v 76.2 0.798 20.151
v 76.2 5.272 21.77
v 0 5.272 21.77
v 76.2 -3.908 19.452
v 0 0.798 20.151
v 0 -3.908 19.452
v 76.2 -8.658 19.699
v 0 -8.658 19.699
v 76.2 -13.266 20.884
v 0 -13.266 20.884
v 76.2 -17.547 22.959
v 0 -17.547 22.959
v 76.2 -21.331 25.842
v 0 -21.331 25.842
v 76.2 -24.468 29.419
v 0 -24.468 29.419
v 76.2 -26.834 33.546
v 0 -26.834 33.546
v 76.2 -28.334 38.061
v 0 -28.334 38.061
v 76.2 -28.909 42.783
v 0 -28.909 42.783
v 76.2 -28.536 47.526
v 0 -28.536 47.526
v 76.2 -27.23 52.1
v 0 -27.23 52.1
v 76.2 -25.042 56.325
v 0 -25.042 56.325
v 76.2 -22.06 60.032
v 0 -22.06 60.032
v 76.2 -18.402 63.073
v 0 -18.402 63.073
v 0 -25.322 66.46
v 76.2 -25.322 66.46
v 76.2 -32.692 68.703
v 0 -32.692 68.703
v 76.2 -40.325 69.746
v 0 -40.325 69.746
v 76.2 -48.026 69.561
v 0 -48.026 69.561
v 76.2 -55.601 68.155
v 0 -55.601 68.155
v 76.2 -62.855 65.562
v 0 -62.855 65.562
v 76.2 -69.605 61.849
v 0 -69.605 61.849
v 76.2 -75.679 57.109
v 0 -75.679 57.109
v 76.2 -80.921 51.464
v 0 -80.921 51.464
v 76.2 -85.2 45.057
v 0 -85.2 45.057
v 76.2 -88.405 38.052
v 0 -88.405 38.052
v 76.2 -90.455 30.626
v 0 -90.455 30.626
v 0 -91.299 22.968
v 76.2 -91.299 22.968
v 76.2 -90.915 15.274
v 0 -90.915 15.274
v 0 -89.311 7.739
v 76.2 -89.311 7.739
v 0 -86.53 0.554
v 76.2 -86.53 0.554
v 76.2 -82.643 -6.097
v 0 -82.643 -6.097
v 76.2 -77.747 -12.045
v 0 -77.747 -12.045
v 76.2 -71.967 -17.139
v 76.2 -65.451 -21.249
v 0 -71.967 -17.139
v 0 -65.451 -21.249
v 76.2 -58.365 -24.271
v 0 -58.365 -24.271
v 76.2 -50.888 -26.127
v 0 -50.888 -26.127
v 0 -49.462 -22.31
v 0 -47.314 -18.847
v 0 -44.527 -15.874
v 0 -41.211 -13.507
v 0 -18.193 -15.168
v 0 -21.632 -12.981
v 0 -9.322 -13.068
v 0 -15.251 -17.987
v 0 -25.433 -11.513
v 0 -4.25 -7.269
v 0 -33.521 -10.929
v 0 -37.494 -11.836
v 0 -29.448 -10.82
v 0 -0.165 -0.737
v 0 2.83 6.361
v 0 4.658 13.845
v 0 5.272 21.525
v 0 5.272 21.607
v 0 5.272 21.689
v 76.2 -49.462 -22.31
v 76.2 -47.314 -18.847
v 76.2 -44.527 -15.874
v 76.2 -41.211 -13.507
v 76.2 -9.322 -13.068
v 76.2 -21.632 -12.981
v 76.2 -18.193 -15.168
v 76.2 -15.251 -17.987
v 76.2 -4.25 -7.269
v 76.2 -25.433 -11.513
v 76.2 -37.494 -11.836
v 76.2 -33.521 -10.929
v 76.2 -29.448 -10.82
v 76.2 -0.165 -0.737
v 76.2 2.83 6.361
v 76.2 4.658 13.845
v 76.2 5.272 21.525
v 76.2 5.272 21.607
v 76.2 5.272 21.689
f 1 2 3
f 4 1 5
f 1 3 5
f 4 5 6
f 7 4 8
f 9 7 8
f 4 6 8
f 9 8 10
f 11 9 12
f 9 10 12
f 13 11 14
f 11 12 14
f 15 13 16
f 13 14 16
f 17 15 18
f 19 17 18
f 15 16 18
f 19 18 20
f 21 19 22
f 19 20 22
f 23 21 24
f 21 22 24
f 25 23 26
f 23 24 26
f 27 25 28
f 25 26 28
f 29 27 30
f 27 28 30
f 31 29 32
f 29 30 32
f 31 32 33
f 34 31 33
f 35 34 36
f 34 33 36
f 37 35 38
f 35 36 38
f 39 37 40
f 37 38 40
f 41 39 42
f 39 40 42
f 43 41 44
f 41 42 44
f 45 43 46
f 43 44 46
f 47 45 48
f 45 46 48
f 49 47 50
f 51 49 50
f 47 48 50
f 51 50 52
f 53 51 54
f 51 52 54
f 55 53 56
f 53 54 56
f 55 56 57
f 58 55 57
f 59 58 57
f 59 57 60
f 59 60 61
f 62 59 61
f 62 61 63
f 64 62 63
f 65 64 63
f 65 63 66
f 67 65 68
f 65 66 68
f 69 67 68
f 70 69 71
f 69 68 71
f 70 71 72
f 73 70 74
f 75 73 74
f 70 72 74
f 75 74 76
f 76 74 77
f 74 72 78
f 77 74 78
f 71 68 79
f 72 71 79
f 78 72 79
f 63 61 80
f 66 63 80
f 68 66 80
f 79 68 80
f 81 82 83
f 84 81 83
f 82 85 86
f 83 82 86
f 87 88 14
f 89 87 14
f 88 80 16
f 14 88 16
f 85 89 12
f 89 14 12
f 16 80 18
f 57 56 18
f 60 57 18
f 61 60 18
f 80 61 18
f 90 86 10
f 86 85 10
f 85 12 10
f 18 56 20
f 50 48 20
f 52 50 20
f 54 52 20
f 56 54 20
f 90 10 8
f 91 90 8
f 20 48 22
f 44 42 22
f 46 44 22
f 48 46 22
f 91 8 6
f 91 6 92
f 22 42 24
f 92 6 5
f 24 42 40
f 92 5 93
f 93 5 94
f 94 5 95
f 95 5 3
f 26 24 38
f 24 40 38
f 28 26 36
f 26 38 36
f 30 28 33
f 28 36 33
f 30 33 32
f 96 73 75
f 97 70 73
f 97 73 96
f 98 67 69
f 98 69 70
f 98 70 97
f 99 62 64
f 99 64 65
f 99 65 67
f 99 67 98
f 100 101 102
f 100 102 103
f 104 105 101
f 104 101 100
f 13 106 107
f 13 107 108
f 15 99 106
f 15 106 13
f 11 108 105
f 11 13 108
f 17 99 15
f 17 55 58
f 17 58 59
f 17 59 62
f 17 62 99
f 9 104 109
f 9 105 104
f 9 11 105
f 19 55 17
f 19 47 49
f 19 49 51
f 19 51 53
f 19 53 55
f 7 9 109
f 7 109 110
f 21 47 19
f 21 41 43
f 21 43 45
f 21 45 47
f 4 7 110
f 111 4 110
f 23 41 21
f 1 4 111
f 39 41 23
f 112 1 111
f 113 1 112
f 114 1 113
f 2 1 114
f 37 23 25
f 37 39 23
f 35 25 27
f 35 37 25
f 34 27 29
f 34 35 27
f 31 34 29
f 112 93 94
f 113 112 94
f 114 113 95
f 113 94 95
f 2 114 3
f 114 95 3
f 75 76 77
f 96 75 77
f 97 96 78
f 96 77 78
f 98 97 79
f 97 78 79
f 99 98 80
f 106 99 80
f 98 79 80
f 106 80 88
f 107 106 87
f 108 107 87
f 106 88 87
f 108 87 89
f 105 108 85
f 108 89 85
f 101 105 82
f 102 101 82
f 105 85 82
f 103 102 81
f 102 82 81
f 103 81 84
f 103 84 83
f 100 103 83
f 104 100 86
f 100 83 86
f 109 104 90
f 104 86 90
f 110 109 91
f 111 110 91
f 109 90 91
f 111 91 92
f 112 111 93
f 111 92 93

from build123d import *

# Parameters (mm, degrees)
F1_DEPTH = 76.2


with BuildPart() as f1:
    # F0 (on Right) → F1 (new body)
    with BuildSketch(Plane.YZ):
        with BuildLine():
            ThreePointArc((-50.8877843666, -26.1272218461), (-35.5301604305, -11.2844595025), (-15.2511948734, -17.9872770357))
            ThreePointArc((-15.2511948734, -17.9872770357), (-0.1647004468, -0.7373577806), (5.2721587586, 21.5247757733))
            ThreePointArc((5.2721587586, 21.5247757733), (5.2720026358, 21.6475777712), (5.2715342684, 21.7703789752))
            ThreePointArc((5.2715342684, 21.7703789752), (-25.7544503942, 31.4232390217), (-18.4018610728, 63.0733395213))
            ThreePointArc((-18.4018610728, 63.0733395213), (-88.4049130397, 38.0519285625), (-50.8877843666, -26.1272218461))
        make_face()
    extrude(amount=F1_DEPTH)


solid = f1.part
